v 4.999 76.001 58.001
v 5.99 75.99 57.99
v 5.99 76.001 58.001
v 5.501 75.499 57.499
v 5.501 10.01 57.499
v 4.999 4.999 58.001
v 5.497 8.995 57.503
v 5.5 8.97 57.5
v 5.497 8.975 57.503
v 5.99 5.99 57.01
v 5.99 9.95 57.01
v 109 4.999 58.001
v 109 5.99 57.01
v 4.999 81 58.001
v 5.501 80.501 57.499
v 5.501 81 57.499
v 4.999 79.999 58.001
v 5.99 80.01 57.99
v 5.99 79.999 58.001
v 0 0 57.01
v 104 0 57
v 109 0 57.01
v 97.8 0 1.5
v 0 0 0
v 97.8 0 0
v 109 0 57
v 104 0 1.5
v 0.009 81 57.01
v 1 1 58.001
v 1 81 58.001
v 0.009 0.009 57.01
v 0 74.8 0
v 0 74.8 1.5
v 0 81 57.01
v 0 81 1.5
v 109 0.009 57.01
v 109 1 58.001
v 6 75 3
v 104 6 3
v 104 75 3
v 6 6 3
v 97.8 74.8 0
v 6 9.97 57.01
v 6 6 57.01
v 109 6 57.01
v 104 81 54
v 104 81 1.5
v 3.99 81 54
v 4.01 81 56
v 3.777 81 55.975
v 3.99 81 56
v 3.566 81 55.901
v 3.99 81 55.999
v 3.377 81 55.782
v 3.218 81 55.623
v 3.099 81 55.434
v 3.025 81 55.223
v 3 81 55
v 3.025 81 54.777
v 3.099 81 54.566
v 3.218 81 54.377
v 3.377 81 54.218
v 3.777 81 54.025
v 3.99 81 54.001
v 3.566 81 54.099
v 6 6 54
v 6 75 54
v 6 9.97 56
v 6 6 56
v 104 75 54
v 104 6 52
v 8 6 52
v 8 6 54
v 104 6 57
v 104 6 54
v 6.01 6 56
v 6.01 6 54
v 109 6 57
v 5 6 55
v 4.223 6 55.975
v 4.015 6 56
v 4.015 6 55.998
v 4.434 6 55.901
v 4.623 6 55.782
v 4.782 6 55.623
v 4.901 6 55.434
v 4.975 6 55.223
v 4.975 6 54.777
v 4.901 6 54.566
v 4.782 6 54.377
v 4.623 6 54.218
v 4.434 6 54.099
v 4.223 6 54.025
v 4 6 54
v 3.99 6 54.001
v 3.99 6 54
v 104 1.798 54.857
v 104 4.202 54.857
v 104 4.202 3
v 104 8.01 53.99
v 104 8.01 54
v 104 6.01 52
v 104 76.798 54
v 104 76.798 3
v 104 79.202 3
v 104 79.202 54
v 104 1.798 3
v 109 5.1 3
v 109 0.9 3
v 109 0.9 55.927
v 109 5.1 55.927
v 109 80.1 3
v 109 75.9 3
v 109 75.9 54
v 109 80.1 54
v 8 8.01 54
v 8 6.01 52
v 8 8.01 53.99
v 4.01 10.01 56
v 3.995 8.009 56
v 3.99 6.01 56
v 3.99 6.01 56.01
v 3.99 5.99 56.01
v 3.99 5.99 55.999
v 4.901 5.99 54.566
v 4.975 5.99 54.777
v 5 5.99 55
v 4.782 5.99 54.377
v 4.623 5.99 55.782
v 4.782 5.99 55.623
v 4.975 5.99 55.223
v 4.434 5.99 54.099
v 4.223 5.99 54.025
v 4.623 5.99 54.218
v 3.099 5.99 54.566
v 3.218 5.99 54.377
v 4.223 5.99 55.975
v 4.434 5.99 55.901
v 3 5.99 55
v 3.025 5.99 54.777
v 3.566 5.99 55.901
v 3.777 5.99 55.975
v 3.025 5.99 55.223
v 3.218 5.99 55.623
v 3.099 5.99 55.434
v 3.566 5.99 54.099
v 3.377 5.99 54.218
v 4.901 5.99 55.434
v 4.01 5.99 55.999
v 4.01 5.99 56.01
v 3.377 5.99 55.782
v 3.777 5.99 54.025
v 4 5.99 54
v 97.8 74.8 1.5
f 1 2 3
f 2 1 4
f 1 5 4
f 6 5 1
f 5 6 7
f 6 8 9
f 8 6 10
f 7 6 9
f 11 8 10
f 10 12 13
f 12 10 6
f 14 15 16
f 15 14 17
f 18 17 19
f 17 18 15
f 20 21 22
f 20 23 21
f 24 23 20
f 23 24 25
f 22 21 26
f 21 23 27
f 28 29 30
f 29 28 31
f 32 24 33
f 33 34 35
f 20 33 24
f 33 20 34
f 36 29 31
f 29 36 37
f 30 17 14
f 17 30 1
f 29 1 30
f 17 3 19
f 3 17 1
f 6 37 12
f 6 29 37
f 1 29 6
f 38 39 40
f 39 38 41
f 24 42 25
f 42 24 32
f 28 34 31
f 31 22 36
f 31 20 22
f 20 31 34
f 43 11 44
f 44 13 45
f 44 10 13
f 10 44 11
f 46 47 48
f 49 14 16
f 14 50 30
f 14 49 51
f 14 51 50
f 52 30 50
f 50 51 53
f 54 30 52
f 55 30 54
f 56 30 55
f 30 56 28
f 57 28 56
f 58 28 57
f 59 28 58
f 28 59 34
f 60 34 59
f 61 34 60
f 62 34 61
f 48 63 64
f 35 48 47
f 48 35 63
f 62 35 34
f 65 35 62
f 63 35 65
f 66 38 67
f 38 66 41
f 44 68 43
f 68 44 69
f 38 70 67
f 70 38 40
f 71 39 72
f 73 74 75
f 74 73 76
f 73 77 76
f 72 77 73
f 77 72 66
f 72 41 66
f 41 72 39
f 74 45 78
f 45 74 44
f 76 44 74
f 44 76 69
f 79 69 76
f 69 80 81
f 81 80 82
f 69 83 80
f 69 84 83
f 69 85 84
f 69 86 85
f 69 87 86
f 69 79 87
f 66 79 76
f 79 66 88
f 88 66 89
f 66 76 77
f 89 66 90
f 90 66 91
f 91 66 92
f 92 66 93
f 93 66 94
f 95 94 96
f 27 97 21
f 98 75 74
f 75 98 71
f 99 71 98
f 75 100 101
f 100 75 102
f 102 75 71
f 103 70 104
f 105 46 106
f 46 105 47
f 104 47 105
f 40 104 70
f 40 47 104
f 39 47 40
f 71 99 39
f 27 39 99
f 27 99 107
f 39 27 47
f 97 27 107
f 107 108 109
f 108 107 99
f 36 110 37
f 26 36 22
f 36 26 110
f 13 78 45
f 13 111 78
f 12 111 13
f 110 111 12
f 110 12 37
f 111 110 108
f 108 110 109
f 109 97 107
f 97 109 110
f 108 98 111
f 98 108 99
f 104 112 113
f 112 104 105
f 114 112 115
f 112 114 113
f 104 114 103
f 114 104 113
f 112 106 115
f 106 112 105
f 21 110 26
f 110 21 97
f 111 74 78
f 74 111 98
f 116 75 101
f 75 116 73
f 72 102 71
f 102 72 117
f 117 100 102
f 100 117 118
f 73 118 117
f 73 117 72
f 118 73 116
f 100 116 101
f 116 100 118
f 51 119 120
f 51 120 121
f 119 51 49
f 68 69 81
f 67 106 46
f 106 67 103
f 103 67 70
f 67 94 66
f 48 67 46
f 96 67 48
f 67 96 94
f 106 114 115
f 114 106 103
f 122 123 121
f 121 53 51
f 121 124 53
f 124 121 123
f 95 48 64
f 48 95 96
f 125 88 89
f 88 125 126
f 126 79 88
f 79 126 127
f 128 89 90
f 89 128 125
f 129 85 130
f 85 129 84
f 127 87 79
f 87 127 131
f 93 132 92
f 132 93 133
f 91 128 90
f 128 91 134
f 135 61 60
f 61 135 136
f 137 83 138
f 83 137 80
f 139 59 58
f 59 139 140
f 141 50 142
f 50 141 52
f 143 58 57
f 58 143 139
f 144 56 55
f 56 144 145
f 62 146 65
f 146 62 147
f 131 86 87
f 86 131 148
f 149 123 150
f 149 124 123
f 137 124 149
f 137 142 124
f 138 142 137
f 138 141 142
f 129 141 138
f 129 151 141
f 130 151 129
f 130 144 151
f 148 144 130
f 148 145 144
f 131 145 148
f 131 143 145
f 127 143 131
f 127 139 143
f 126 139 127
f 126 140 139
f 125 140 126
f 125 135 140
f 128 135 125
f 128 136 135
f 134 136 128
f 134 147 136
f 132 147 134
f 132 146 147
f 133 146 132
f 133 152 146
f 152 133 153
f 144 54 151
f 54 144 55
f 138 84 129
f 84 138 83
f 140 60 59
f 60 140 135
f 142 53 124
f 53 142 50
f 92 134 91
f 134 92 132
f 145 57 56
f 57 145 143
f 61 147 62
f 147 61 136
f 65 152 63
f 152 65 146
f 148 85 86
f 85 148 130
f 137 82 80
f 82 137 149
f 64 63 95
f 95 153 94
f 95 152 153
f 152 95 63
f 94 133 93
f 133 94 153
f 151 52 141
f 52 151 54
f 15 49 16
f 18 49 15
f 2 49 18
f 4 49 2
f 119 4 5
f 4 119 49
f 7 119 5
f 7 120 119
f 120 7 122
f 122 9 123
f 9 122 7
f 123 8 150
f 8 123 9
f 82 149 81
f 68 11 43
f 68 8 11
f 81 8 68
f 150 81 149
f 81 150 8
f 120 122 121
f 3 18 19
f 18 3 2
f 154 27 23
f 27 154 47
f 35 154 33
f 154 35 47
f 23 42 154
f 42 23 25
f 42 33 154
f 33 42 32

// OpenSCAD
// ============================================================================
// cutlery_box.scad
// Graduated 3-chamber disposable-cutlery box (Option 3) — CUT-FROM-SOLID port
// of build_box.py, for a 120 x 120 x 120 mm printer (AOSEED).
//
// WHY THIS PORT EXISTS (the whole point):
//   The hand-mesh generator (build_box.py) could not keep the 1 mm rim chamfer
//   continuous across the female dovetail joints, because where a slot's flared
//   corner crosses the sloped chamfer it needs a true boolean intersection.
//   OpenSCAD HAS that boolean kernel, so here we do exactly the "cut-from-solid"
//   thing:
//      1. Build the ENTIRE box as ONE solid, WITH the chamfer already on it.
//      2. difference() out vertical dovetail prisms ( /_\ cross-section ),
//         running from just above the base plate up THROUGH the rim, to both
//         (a) form the sliding-dovetail joints, and
//         (b) split the box into 6 bed-sized pieces.
//   Because the cut is a real boolean through the already-chamfered solid, the
//   sloped chamfer<->slot edge is produced for free => the rim chamfer stays
//   CONTINUOUS across every joint, with none of the sliver hacks.
//
// ----------------------------------------------------------------------------
// HOW TO USE
//   In the app:  set `part` below (or use the Customizer dropdown), F5 to
//                preview, F6 to render, then File > Export > STL.
//   One piece (CLI):
//      openscad -o body_knife_A.stl -D 'part="knife_A"' cutlery_box.scad
//   ALL SIX (bash, run from this folder):
//      for p in knife_A knife_B fork_A fork_B spoon_A spoon_B; do \
//        openscad -o "body_$p.stl" -D "part=\"$p\"" cutlery_box.scad ; done
//   PNG preview of one piece:
//      openscad -o knife_B.png --imgsize=1400,1000 --autocenter --viewall \
//        -D 'part="knife_B"' cutlery_box.scad
//
//   Pieces are modelled in ASSEMBLED coordinates (floor-down, z=0 is the bed),
//   so importing all six STLs together shows the assembled box directly; your
//   slicer will auto-drop each one onto the plate for printing.
//
// BED SANITY: every piece is <= 120 mm in X, Y, Z.
//   Z = 58 mm. Widest piece = spoon at 117 mm (Y). A-halves reach 109 mm (X,
//   including the protruding dovetail key). All under 120.
//
// !! I could NOT run OpenSCAD to verify this file (no binary in my sandbox) !!
//   - The rim chamfer is a SMOOTH, true-45 bevel built from hull() frustums of
//     convex rectangles. Works in every OpenSCAD since ~2015 (incl. Homebrew
//     2021.01). No stepped staircase -- and, crucially, it makes box() a clean
//     well-formed solid so the per-part booleans resolve reliably (the old
//     14-slice staircase was fragile and CGAL was dropping the walls of the
//     interior parts, leaving only the key prisms => "floating boxes").
//   - roof() is still available behind USE_ROOF=true for those who have it
//     (2021.01+ snapshots); for THIS rectangular design it is identical, so it
//     is NOT required.
//   - After F6, check the console for "WARNING"/"not a valid 2-manifold".
//     If a tenon ever looks detached, bump EPS to 0.05.
// ============================================================================


/* [Part to render / export] */
part = "knife_A"; // [knife_A, knife_B, fork_A, fork_B, spoon_A, spoon_B, assembly]

/* [Chamfer method] */
// false = smooth hull() frustum bevel (default, any OpenSCAD); true = roof() (2021.01+)
USE_ROOF = false;

/* [Heights (mm)] */
BASE   = 3.0;     // floor / base-plate thickness
COMP_H = 55.0;    // interior wall height above the floor (cutlery stack depth)

/* [Walls (mm)] */
HOST_T   = 6.0;     // thickness of every wall (thick enough to host a dovetail)
HALF_LEN = 104.0;   // printed length of each half (A = near, B = far); <120 incl. key

/* [Chamber bays (mm)] */
N_COL     = 3;       // columns of cutlery per chamber
KNIFE_COL = 23.0;    // -> knife bay 69  (3 x 19 mm knives + play)
FORK_COL  = 33.0;    // -> fork  bay 99  (3 x 29 mm forks  + play)
SPOON_COL = 37.0;    // -> spoon bay 111 (3 x 34 mm spoons + play, trimmed <120)

/* [Dovetail joint (mm)] */
DT_DEPTH = 5.0;   // tail protrusion past the seam (male key depth)
DT_NECK  = 1.2;   // half-width at the seam face (narrow)
DT_FLARE = 2.1;   // half-width at the tip (wide -> locks)
DT_CLR   = 0.4;   // FLANK/seam slide clearance added to the female socket (do not change for fit)
DT_DEPTH_RELIEF = 0.3; // extra depth on the socket BACK only, so the tail tip never bottoms out

/* [Hidden-dovetail top cap / "hat" (mm)] */
// The dovetail otherwise shows its trapezoid outline on the TOP edge of the wall.
// To hide it, the MALE piece extends the wall's full-width top (chamfer included)
// across the key footprint -> a flush, continuous top. The FEMALE piece gets a
// matching top RECESS (cap footprint + CAP_CLR) so the cap drops straight in.
// Result: the top reads as one surface with a single straight seam line at the cap
// tip; the dovetail joinery lives entirely below the cap.
//
// SELF-SUPPORTING UNDERSIDE: the cap reaches the FULL wall width at the chamfer base
// (so the top edge reads as the wall extended, with NO recessed sliver on the outer
// face), and its underside is ONE planar ramp from the chamfer's OUTER CORNER
// (half-width HOST_T/2 at z = BODY_H-CHAMFER) down to the dovetail-neck half-width
// (CAP_FOOT) at CAP_SLANT_DEG from horizontal. No little horizontal step. The ramp
// reaching full width exactly at the chamfer base means "ramp top" == "chamfer base"
// (CAP_H is DERIVED). The FEMALE recess is the same ramp + CAP_CLR play.
// TRADEOFF: because the cap runs all the way to the outer corner, the female wall
// tapers to ~0 at z = BODY_H-CHAMFER -> a thin feather edge at the joint (gradual at
// CAP_SLANT_DEG, hidden inside the joint when assembled). Accepted per design intent.
CAP_SLANT_DEG = 50;     // cap underside ramp angle from horizontal (50 = self-supporting, long flare)
CAP_FOOT = DT_NECK;     // cap-underside half-width where it meets the dovetail neck
CAP_CLR = 0.3;          // slide clearance so the male cap seats into the female top recess

/* [Rim chamfer (mm)] */
CHAMFER = 1.0;    // 45-deg comfort break broken along the top wall edges

/* [Base half-lap / anti-warp (mm)] */
// Neighbouring base plates overlap as a HORIZONTAL half-lap (shiplap) at mid-base
// height, so corners stay coplanar (no lift/protrusion). Horizontal lap faces do
// NOT bind the vertical-drop assembly. Shingle direction: A->B and knife->fork->spoon.
LAP_LEN = 6;        // overlap past the A/B seam and the knife/fork seam
LAP_LEN_FS = 2;     // overlap past the fork/SPOON seam -- SMALLER: spoon is the
                    // tightest piece (117mm of the 120mm bed); a 6mm lap there
                    // would push spoon to 123mm. 2mm keeps spoon at 119mm.
LAP_Z   = BASE/2;   // 1.5 -- horizontal split height of the lap (bottom vs top half)
LAP_CLR = 0.2;      // in-plane clearance so the shelf isn't a press fit

/* [Lid — box features that receive a flat ORDERED clear sheet] */
// The lid itself is NOT printed: it's a flat ~2 mm PETG/Tritan sheet, bullnose-polished
// edges (r=LID_EDGE_R), ordered to size. We only model the box features that receive it.
LID_T            = 2.0;   // ordered sheet thickness
LID_EDGE_R       = 1.0;   // ordered sheet bullnose edge radius (for the sheet order spec)
LID_PLAY         = 0.4;   // total vertical play in the hinge groove (sheet + this)
LID_RECESS       = 2.0;   // lid TOP sits this far BELOW the rim, so the journal pocket is fully
                          // capped (rim caps the bullnose -> retains the lid when raised; tilt-in)
HINGE_AT_MINUS_X = true;  // hinge on the -x (303mm) end wall; clip on +x. (flip = mirror; default delivered)
// perimeter support ledge (lid underside rests on it at z = BODY_H-LID_T)
LEDGE_W          = 2.0;   // ledge inward protrusion (its underside ramps back at 45 deg -> self-supporting)
GROOVE_END_INSET = 0.0;   // journal runs the full chamber width, right to the corners
GROOVE_TAPER     = 4.0;   // y-length over which the eased mouth tapers out at each groove end
// hinge journal (cut into the inner face of the hinge end wall, CONTINUOUS along the long edge)
GROOVE_DEPTH     = 3.0;   // 2mm lead-in slot + 1mm pocket radius -> journal sits 2mm back from the
                          // face so its cap clears the swing relief and RETAINS the lid
GROOVE_POCKET_R  = 1.0;   // journal half-cylinder radius (the bullnose sheet edge rolls in it)
// clip latch (one localized retainer, centered on the clip end wall)
CLIP_W           = 18.0;  // clip width
CLIP_LIP         = 0.4;   // retaining overhang (0.3 light .. 0.6 firm)
CLIP_RAMP_H      = 1.6;   // cam-ramp height above the rim (press-to-close)
// finger scallop (semicircular dish in the rim, centered on & aligned with the clip)
SCALLOP_W        = 16.0;  // scallop width
SCALLOP_DEPTH    = 6.0;   // how far it dishes down from the rim


/* [Hidden] */
EPS      = 0.01;          // tiny overlap so abutting solids fuse cleanly in CGAL
// Upper-chamber pieces (fork, spoon) were cut by a cell plane laid EXACTLY on the
// divider wall's far face (the lower chamber owns that wall). intersection() along a
// plane coincident with an existing box face makes CGAL leave a ZERO-THICKNESS copy
// of the wall face -> edge-manifold + "watertight" but degenerate (OpenSCAD shows it
// as a blue back-face; Tinkercad thickens it into a phantom block). SEAM_EPS nudges
// those cut planes a hair INTO the open bay so they no longer coincide with any box
// face -> no flap. 0.02 mm is physically nothing but is well clear of CGAL's tolerance.
SEAM_EPS = 0.02;
CUT_OVER = 1.0;           // how far dovetail cutters overshoot the rim (clean cut)

BODY_H    = BASE + COMP_H;     // 58  total height
END_WALL  = HOST_T;            // end walls are dovetail hosts too -> equally thick
TOTAL_LEN = 2 * HALF_LEN;      // 208 assembled length (end wall .. end wall)

// hidden-cap ramp geometry (derived).
//   CAP_HW    = cap MAX half-width = HOST_T/2 (the full wall edge) at the chamfer base.
//   CAP_RISE  = vertical height of the self-supporting CAP_SLANT_DEG underside ramp.
//   CAP_ZRAMP = where the cap reaches full width = the chamfer base (BODY_H-CHAMFER), so
//               the ramp runs straight to the chamfer OUTER CORNER (no horizontal step).
//   CAP_ZBOT  = cap bottom = ramp start; CAP_H derived from it (for reference/report).
//   CAP_ZRAMP_R = recess ramp top, shifted down by CAP_CLR so the recess ramp stays
//               parallel to the cap ramp with uniform play.
CAP_HW      = HOST_T/2;   // cap reaches the FULL wall edge at the chamfer base
CAP_RISE    = (CAP_HW - CAP_FOOT) * tan(CAP_SLANT_DEG);
CAP_ZRAMP   = BODY_H - CHAMFER;               // full width exactly at the chamfer base / outer corner
CAP_ZBOT    = CAP_ZRAMP - CAP_RISE;
CAP_H       = BODY_H - CAP_ZBOT;              // derived; reported
CAP_ZRAMP_R = CAP_ZRAMP;   // recess ramp ALSO tops at the chamfer corner (mirror the cap) -> no vertical lip
// sanity checks
assert(CAP_ZBOT > BASE + 1,
       "cap zone dips too low -- raise CAP_SLANT_DEG");
assert(CAP_HW >= DT_FLARE,
       "cap too narrow to cover the dovetail tail");

// NOTE: lid-derived constants are defined BELOW the Y-layout block, because some of
// them (INTERIOR_Y0/Y1, CLIP_CY) depend on OUTER_L / OUTER_R / EXT_W. See "lid derived".

// bay widths
KNIFE_BAY = N_COL * KNIFE_COL; // 69
FORK_BAY  = N_COL * FORK_COL;  // 99
SPOON_BAY = N_COL * SPOON_COL; // 111

// ---- Y layout (width direction): wall | bay | divider | bay | divider | bay | wall
KNIFE_Y0 = 0;
KNIFE_Y1 = HOST_T + KNIFE_BAY + HOST_T;        // 0..81   (outer wall + bay + divider)
FORK_Y0  = KNIFE_Y1;                           // 81
FORK_Y1  = FORK_Y0 + FORK_BAY + HOST_T;        // 81..186 (bay + divider)
SPOON_Y0 = FORK_Y1;                            // 186
SPOON_Y1 = SPOON_Y0 + SPOON_BAY + HOST_T;      // 186..303(bay + outer wall)
EXT_W    = SPOON_Y1;                           // 303 total width

// lengthwise wall Y-bands [y0,y1] (host the A/B dovetails) + their centers
OUTER_L  = [0, HOST_T];                                       // [0,6]    c=3
DIV_KF   = [HOST_T + KNIFE_BAY, HOST_T + KNIFE_BAY + HOST_T]; // [75,81]  c=78
DIV_FS   = [FORK_Y0 + FORK_BAY, FORK_Y0 + FORK_BAY + HOST_T]; // [180,186]c=183
OUTER_R  = [SPOON_Y1 - HOST_T, SPOON_Y1];                     // [297,303]c=300

// ---- lid derived ---- (placed AFTER OUTER_L/OUTER_R/EXT_W so nothing is forward-referenced)
LID_TOP_Z   = BODY_H - LID_RECESS;        // 56  lid TOP (recessed); rim z=58 rises LID_RECESS above it
LID_Z_UNDER = LID_TOP_Z - LID_T;          // 54  lid underside / ledge top / lowered-divider top
POCKET_CZ   = LID_TOP_Z - LID_T/2;        // 55  journal centre (lid mid) -> pocket top = LID_TOP_Z = capped
// hinge end-wall inner face x + inward direction; clip end-wall inner face x + inward dir
HINGE_INX   = HINGE_AT_MINUS_X ? END_WALL : TOTAL_LEN - END_WALL;       // 6  (default)
HINGE_IN    = HINGE_AT_MINUS_X ? 1 : -1;  // interior direction from the hinge wall (+x default)
CLIP_INX    = HINGE_AT_MINUS_X ? TOTAL_LEN - END_WALL : END_WALL;       // 202 (default)
CLIP_IN     = HINGE_AT_MINUS_X ? -1 : 1;  // interior direction from the clip wall (-x default)
POCKET_CX   = HINGE_INX - HINGE_IN*(GROOVE_DEPTH - GROOVE_POCKET_R);    // 5  pocket centre x (INTO the wall)
INTERIOR_Y0 = OUTER_L[1];                 // 6   inner face of the -y short wall
INTERIOR_Y1 = OUTER_R[0];                 // 297 inner face of the +y short wall
CLIP_CY     = EXT_W/2;                     // 151.5 clip/scallop centre (in the fork chamber)
assert(POCKET_CZ - GROOVE_POCKET_R > BASE + 1,
       "journal dips too low -- reduce LID_RECESS or LID_T");
assert(POCKET_CZ + GROOVE_POCKET_R <= LID_TOP_Z + EPS,
       "journal not capped -- lower the lid (raise LID_RECESS) or shrink GROOVE_POCKET_R");
// NOTE: with LID_RECESS the lid underside (and lowered dividers) sit BELOW CAP_ZBOT. That is
// intended: the inner dividers are cut flat below the cap zone (their hidden caps are removed,
// but the lid covers them); the perimeter/end-wall caps are untouched (full-height walls).

// the three OPEN bays are rectangular holes in the wall footprint:
//   footprint = outer rectangle MINUS these bays  (== the 6 walls; verified).
// The smooth chamfer is built from exactly this decomposition.
BAY_X0 = END_WALL;              // 6
BAY_X1 = TOTAL_LEN - END_WALL;  // 202
BAYS = [
    [BAY_X0, BAY_X1, HOST_T,   HOST_T + KNIFE_BAY],   // knife bay [6,202] x [6,75]
    [BAY_X0, BAY_X1, FORK_Y0,  FORK_Y0 + FORK_BAY],   // fork  bay [6,202] x [81,180]
    [BAY_X0, BAY_X1, SPOON_Y0, SPOON_Y0 + SPOON_BAY], // spoon bay [6,202] x [186,297]
];

YC_OUTL  = OUTER_L[0] + HOST_T/2;   // 3   outer-left wall center
YC_DIVKF = DIV_KF[0]  + HOST_T/2;   // 78  knife/fork divider center
YC_DIVFS = DIV_FS[0]  + HOST_T/2;   // 183 fork/spoon divider center
YC_OUTR  = OUTER_R[0] + HOST_T/2;   // 300 outer-right wall center

// seams
AB_SEAM = HALF_LEN;               // 104  A/B length seam (x)
SEAM_KF = FORK_Y0;                // 81   knife/fork width seam (y)
SEAM_FS = SPOON_Y0;              // 186  fork/spoon width seam (y)
ENDC_A  = END_WALL/2;             // 3    A end-wall center (x) -> chamber dovetails
ENDC_B  = TOTAL_LEN - END_WALL/2; // 205  B end-wall center (x)


// ============================================================================
// 2D wall footprint (cross-section of all walls, constant in z for the straight
// part). Union of: 2 full-width end walls + 4 lengthwise walls between them.
// ============================================================================
module wall_footprint_2d() {
    // footprint = outer rectangle minus the 3 open bays  (== the 6 walls)
    difference() {
        square([TOTAL_LEN, EXT_W]);
        for (b = BAYS) translate([b[0], b[2]]) square([b[1] - b[0], b[3] - b[2]]);
    }
}

// ============================================================================
// The full chamfered box solid = base plate + walls with a continuous 1 mm
// top-rim chamfer. Built ONCE; every piece is carved out of this.
// ============================================================================
module chamfer_cap() {
    // SMOOTH 45 rim chamfer over z[BODY_H-CHAMFER, BODY_H], in absolute coords.
    zm = BODY_H - CHAMFER;
    if (USE_ROOF) {
        // exact straight-skeleton roof, capped at CHAMFER height (needs roof()).
        intersection() {
            translate([0,0,zm]) roof() wall_footprint_2d();
            translate([0,0,zm]) linear_extrude(CHAMFER + EPS) wall_footprint_2d();
        }
    } else {
        // DEFAULT: true 45 bevel as hull() frustums of CONVEX rectangles -> smooth
        // AND a clean manifold.  Since footprint = outer - bays, the chamfer of the
        // footprint = (outer rectangle beveled inward) MINUS (each bay beveled so it
        // grows toward the top, which bevels every bay-facing rim).  All hull()s are
        // on convex rectangles, so nothing gets convex-filled.
        difference() {
            // outer perimeter frustum: full outer rect at zm -> inset by CHAMFER at top
            hull() {
                translate([0,0,zm])     linear_extrude(0.001) square([TOTAL_LEN, EXT_W]);
                translate([0,0,BODY_H]) linear_extrude(0.001) offset(delta=-CHAMFER) square([TOTAL_LEN, EXT_W]);
            }
            // each bay grows by CHAMFER toward the top -> bevels its surrounding rim.
            // (overshoots z a hair past both ends so the cut is clean.)
            for (b = BAYS)
                hull() {
                    translate([0,0,zm-EPS])     linear_extrude(0.001)
                        translate([b[0],b[2]]) offset(delta=-EPS)        square([b[1]-b[0], b[3]-b[2]]);
                    translate([0,0,BODY_H+EPS]) linear_extrude(0.001)
                        translate([b[0],b[2]]) offset(delta=CHAMFER+EPS) square([b[1]-b[0], b[3]-b[2]]);
                }
        }
    }
}

module box() {
    zm = BODY_H - CHAMFER;
    union() {
        cube([TOTAL_LEN, EXT_W, BASE]);                                        // base plate z[0,3]
        translate([0,0,BASE]) linear_extrude(zm - BASE + EPS) wall_footprint_2d(); // straight walls z[3,57]
        chamfer_cap();                                                         // smooth chamfer z[57,58]
    }
}

// ============================================================================
// Dovetail prisms ( /_\ ). Vertical, z[BASE, BODY_H+CUT_OVER] so they cut
// through the rim but leave the base plate continuous. The near face is pushed
// back EPS so a male key always fuses to its wall.
//   male key   : half_n=DT_NECK,         half_f=DT_FLARE
//   female slot: half_n=DT_NECK+DT_CLR,  half_f=DT_FLARE+DT_CLR
// ============================================================================
module dt_prism_X(seam_x, yc, half_n, half_f) {   // perpendicular to X, grows +X
    translate([0,0,BASE]) linear_extrude(BODY_H - BASE + CUT_OVER)
        polygon([[seam_x - EPS,        yc - half_n],
                 [seam_x + DT_DEPTH,   yc - half_f],
                 [seam_x + DT_DEPTH,   yc + half_f],
                 [seam_x - EPS,        yc + half_n]]);
}
module dt_prism_Y(seam_y, xc, half_n, half_f) {   // perpendicular to Y, grows +Y
    translate([0,0,BASE]) linear_extrude(BODY_H - BASE + CUT_OVER)
        polygon([[xc - half_n, seam_y - EPS],
                 [xc - half_f, seam_y + DT_DEPTH],
                 [xc + half_f, seam_y + DT_DEPTH],
                 [xc + half_n, seam_y - EPS]]);
}
module ab_key   (yc)        { dt_prism_X(AB_SEAM, yc, DT_NECK, DT_FLARE); }
module ch_key   (seam_y, xc){ dt_prism_Y(seam_y, xc, DT_NECK, DT_FLARE); }

// Female sockets = male + DT_CLR on the flanks/seam (unchanged), PLUS a straight
// back-face relief of DT_DEPTH_RELIEF so the tail tip never bottoms out. The
// relief is a rectangle tacked onto the trapezoid's tip at the SAME flare width,
// so the angled flank faces (and their 0.4 mm slide clearance) are untouched.
module ab_socket(yc) {
    dt_prism_X(AB_SEAM, yc, DT_NECK + DT_CLR, DT_FLARE + DT_CLR);
    translate([0,0,BASE]) linear_extrude(BODY_H - BASE + CUT_OVER)
        translate([AB_SEAM + DT_DEPTH, yc - (DT_FLARE + DT_CLR)])
            square([DT_DEPTH_RELIEF, 2*(DT_FLARE + DT_CLR)]);          // back relief, +X
}
module ch_socket(seam_y, xc) {
    dt_prism_Y(seam_y, xc, DT_NECK + DT_CLR, DT_FLARE + DT_CLR);
    translate([0,0,BASE]) linear_extrude(BODY_H - BASE + CUT_OVER)
        translate([xc - (DT_FLARE + DT_CLR), seam_y + DT_DEPTH])
            square([2*(DT_FLARE + DT_CLR), DT_DEPTH_RELIEF]);          // back relief, +Y
}

// ===== hidden-dovetail top cap ("hat"), SELF-SUPPORTING underside ===============
// MALE cap: a FULL-wall-width hat whose underside is ONE planar ramp from the chamfer's
// OUTER CORNER (half-width CAP_HW = HOST_T/2 at CAP_ZRAMP = BODY_H-CHAMFER) down to the
// dovetail-neck half-width (CAP_FOOT) at CAP_SLANT_DEG from horizontal -> the self-
// supporting shoulder, running straight to the corner (no horizontal step). Built as
// hull(narrow bottom slab buried in the tail neck, full-width top slab through the rim);
// box() trims it to the wall and adds the continuous rim chamfer for free, so the outer
// top edge reads as the wall extended (no recessed sliver). The protruding NOSE is left
// SQUARE (vertical) -- hidden in the female socket when assembled.
// TRADEOFF: the female wall tapers to ~0 at z=BODY_H-CHAMFER (a thin feather edge at the
// joint, gradual at CAP_SLANT_DEG) -- accepted per design intent.
module ab_cap(yc) {   // A/B seam, grows +X past the seam (length direction)
    hull() {
        translate([AB_SEAM - EPS, yc - CAP_FOOT, CAP_ZBOT])
            cube([DT_DEPTH + EPS, 2*CAP_FOOT, EPS]);
        translate([AB_SEAM - EPS, yc - CAP_HW,   CAP_ZRAMP])
            cube([DT_DEPTH + EPS, 2*CAP_HW, (BODY_H + CUT_OVER) - CAP_ZRAMP]);
    }
}
module ch_cap(seam_y, xc) {   // chamber seam, grows +Y past the seam (in the end wall)
    hull() {
        translate([xc - CAP_FOOT, seam_y - EPS, CAP_ZBOT])
            cube([2*CAP_FOOT, DT_DEPTH + EPS, EPS]);
        translate([xc - CAP_HW,   seam_y - EPS, CAP_ZRAMP])
            cube([2*CAP_HW, DT_DEPTH + EPS, (BODY_H + CUT_OVER) - CAP_ZRAMP]);
    }
}
// FEMALE recess: the SAME ramp grown by CAP_CLR (flanks, tip, floor, and ramp shifted down
// by CAP_CLR so it stays parallel) -> the cap seats with uniform slide clearance. It opens
// to the wall edge (and a hair past, into air) so the cap's full-width corner drops in;
// this is what leaves the thin female feather at the top (accepted). Open upward + toward seam.
module ab_cap_neg(yc) {
    hull() {
        translate([AB_SEAM - EPS, yc - (CAP_FOOT + CAP_CLR), CAP_ZBOT - CAP_CLR])
            cube([DT_DEPTH + CAP_CLR + EPS, 2*(CAP_FOOT + CAP_CLR), EPS]);
        translate([AB_SEAM - EPS, yc - (CAP_HW + EPS), CAP_ZRAMP_R])
            cube([DT_DEPTH + CAP_CLR + EPS, 2*(CAP_HW + EPS), (BODY_H + CUT_OVER + 1) - CAP_ZRAMP_R]);
    }
}
module ch_cap_neg(seam_y, xc) {
    hull() {
        translate([xc - (CAP_FOOT + CAP_CLR), seam_y - EPS, CAP_ZBOT - CAP_CLR])
            cube([2*(CAP_FOOT + CAP_CLR), DT_DEPTH + CAP_CLR + EPS, EPS]);
        translate([xc - (CAP_HW + EPS), seam_y - EPS, CAP_ZRAMP_R])
            cube([2*(CAP_HW + EPS), DT_DEPTH + CAP_CLR + EPS, (BODY_H + CUT_OVER + 1) - CAP_ZRAMP_R]);
    }
}

// rectangular cell (x[xa,xb], y[ya,yb], full height + margin) used to split pieces
module cell(xa, xb, ya, yb) {
    translate([xa, ya, -1]) cube([xb - xa, yb - ya, BODY_H + 11]);
}

// ===== base half-lap (shiplap) =================================================
// HORIZONTAL lap at mid-base height: the shelf-owner keeps its BOTTOM half
// (z 0..LAP_Z) extending LAP_LEN past the seam; the neighbour has its bottom half
// REMOVED there (keeps only the top half) and lands flat on the shelf. Horizontal
// faces => no binding during the vertical drop. Shelves live entirely in the base
// (z < BASE), well clear of the wall dovetails (z >= BASE).
// Shingle = FEMALE-first (matches the no-notch dovetail assembly order, which
// lowers the male piece onto the female): the B half owns the A/B shelf (grows
// -X into A) and the UPPER chamber (fork, spoon) owns the chamber shelf (grows
// -Y into the lower chamber).  Order: spoon, fork, knife; B before A.
module lap_shelf_X(y0, y1) {                 // B-side shelf, grows -X into A past AB_SEAM
    // +EPS past AB_SEAM so the shelf interpenetrates (not just abuts) its own B body -> fuses cleanly.
    translate([AB_SEAM - LAP_LEN, y0, 0]) cube([LAP_LEN + EPS, y1 - y0, LAP_Z]);
}
module lap_neg_X(y0, y1) {                   // A-side: remove bottom half to receive it
    translate([AB_SEAM - LAP_LEN - LAP_CLR, y0 - EPS, -EPS])
        cube([LAP_LEN + LAP_CLR + EPS, (y1 - y0) + 2*EPS, LAP_Z + EPS]);
}
module lap_shelf_Y(seam_y, x0, x1, ln=LAP_LEN) {   // upper-chamber shelf, grows -Y into lower
    // grows -Y by `ln` into the lower chamber AND +Y by 2*SEAM_EPS past the seam so it
    // always overlaps the (SEAM_EPS-nudged) body floor and stays fused -> no floating shelf.
    translate([x0, seam_y - ln, 0]) cube([x1 - x0, ln + 2*SEAM_EPS, LAP_Z]);
}
module lap_neg_Y(seam_y, x0, x1, ln=LAP_LEN) {     // lower-chamber: remove bottom half
    translate([x0 - EPS, seam_y - ln - LAP_CLR, -EPS])
        cube([(x1 - x0) + 2*EPS, ln + LAP_CLR + EPS, LAP_Z + EPS]);
}

// ============================================================================
// LID FEATURES (receive a flat ORDERED clear sheet; the sheet is not printed).
// All features live at the TOP (z >= ~52), ABOVE the dovetail engagement, the half-lap
// (z<1.5) and most of the hat, so the vertical-drop assembly and joints are untouched.
// EPS overlaps throughout; no coincident coplanar faces with the existing walls.
// Default orientation: HINGE on the -x end wall (A pieces), CLIP on the +x end wall
// (B pieces), clip+scallop centred on the fork (middle) chamber.
// ============================================================================

// --- perimeter support ledge: 45-deg self-supporting brackets; rest face at LID_Z_UNDER.
//     Runs along the CLIP end wall + the two short outer walls. (Hinge wall uses the groove.)
//     Built as hull(thin top edge, wall column) -> a triangular bracket whose underside is
//     a 45-deg ramp (prints floor-down with no support). ADDED to each piece (clipped by cell).
//     Each run is INSET by LEDGE_W from the perpendicular walls so the three brackets never
//     overlap at a corner and the wall's normal chamfer wraps every corner uninterrupted.
module lid_ledge() {
    cy0 = INTERIOR_Y0 + LEDGE_W;  cy1 = INTERIOR_Y1 - LEDGE_W;  cyl = cy1 - cy0;   // clip-run y span (inset)
    sx0 = END_WALL    + LEDGE_W;  sxl = (TOTAL_LEN - 2*END_WALL) - 2*LEDGE_W;       // short-run x span (inset)
    // clip end wall (x = CLIP_INX), bracket protrudes toward interior (CLIP_IN)
    hull() {
        translate([CLIP_INX + CLIP_IN*LEDGE_W, cy0, LID_Z_UNDER - EPS]) cube([EPS, cyl, EPS]);
        translate([CLIP_INX - EPS,             cy0, LID_Z_UNDER - LEDGE_W]) cube([2*EPS, cyl, LEDGE_W]);
    }
    // OUTER_L short wall (y = INTERIOR_Y0), bracket protrudes +y
    hull() {
        translate([sx0, INTERIOR_Y0 + LEDGE_W, LID_Z_UNDER - EPS]) cube([sxl, EPS, EPS]);
        translate([sx0, INTERIOR_Y0 - EPS,     LID_Z_UNDER - LEDGE_W]) cube([sxl, 2*EPS, LEDGE_W]);
    }
    // OUTER_R short wall (y = INTERIOR_Y1), bracket protrudes -y
    hull() {
        translate([sx0, INTERIOR_Y1 - LEDGE_W, LID_Z_UNDER - EPS]) cube([sxl, EPS, EPS]);
        translate([sx0, INTERIOR_Y1 - EPS,     LID_Z_UNDER - LEDGE_W]) cube([sxl, 2*EPS, LEDGE_W]);
    }
}

// --- hinge groove: a lead-in slot + a journal half-cylinder pocket, CAPPED at the recessed
//     lid top (LID_TOP_Z). The rim (z[LID_TOP_Z,BODY_H]) caps the bullnose so the lid is
//     RETAINED when raised. Insertion is TILT-IN: raise the lid to the open angle, slide the
//     bullnose under the cap into the journal, swing down to close. A 45-deg mouth-ease
//     relieves the cap's inner-bottom edge (corner at HINGE_INX, LID_TOP_Z) so the lid clears
//     as it swings; the relief TAPERS to nothing over GROOVE_TAPER at each end (clean corners).
//     CONTINUOUS along the long edge (y ~8..295); shaves only the top inner tips of the two
//     chamber dovetails -- engagement below the journal and the ~3mm outer wall remain.
// Relief = ONE straight ramp from the journal's inner-top (POCKET_CX, LID_TOP_Z) up to the
// inner rim (HINGE_INX, BODY_H). No kink; the ~45-deg ramp is self-supporting (prints clean);
// the cap stays full directly over the bullnose (x=POCKET_CX) so retention survives; the relief
// grows toward the inner edge, matching the lid's rotation about the journal.
module mouth_tri() {
    polygon([[POCKET_CX,                LID_TOP_Z - EPS],
             [HINGE_INX + HINGE_IN*EPS, LID_TOP_Z - EPS],
             [HINGE_INX + HINGE_IN*EPS, BODY_H + EPS]]);
}
module mouth_slab(yc, dy) {                          // thin ramp slice centred at yc
    translate([0, yc - dy/2, 0]) rotate([90,0,0]) translate([0,0,-dy]) linear_extrude(dy) mouth_tri();
}
module mouth_taper(yApex, yFull) {                   // relief tapers to nothing at yApex (the ramp apex)
    hull() {
        mouth_slab(yFull, 2*EPS);
        translate([POCKET_CX - EPS, yApex - EPS, LID_TOP_Z - EPS]) cube([2*EPS, 2*EPS, 2*EPS]);
    }
}
module hinge_groove() {
    gy0 = INTERIOR_Y0 + GROOVE_END_INSET;            // 8    start (inset past the corner chamfer)
    gy1 = INTERIOR_Y1 - GROOVE_END_INSET;            // 295  end
    sx0 = min(POCKET_CX, HINGE_INX);  sx1 = max(POCKET_CX, HINGE_INX);   // x[4,6]: 2mm lead-in
    // lead-in slot (sheet thickness, capped at the lid top) from the journal out to the inner face
    translate([sx0 - EPS, gy0, LID_Z_UNDER]) cube([sx1 - sx0 + 2*EPS, gy1 - gy0, LID_TOP_Z - LID_Z_UNDER]);
    // journal half-cylinder 2mm back from the face -> its cap (x[3,5]) clears the relief => retains the lid
    translate([POCKET_CX, gy0 - EPS, POCKET_CZ]) rotate([-90,0,0]) cylinder(h = gy1 - gy0 + 2*EPS, r = GROOVE_POCKET_R, $fn = 28);
    // eased mouth (relieves the cap inner-bottom corner): full middle prism + tapered ends
    mt = min(GROOVE_TAPER, (gy1 - gy0)/2 - EPS);
    translate([0, gy0 + mt, 0]) rotate([90,0,0]) translate([0,0,-((gy1 - mt) - (gy0 + mt))]) linear_extrude((gy1 - mt) - (gy0 + mt)) mouth_tri();
    mouth_taper(gy0, gy0 + mt);                       // taper out at the -y corner
    mouth_taper(gy1, gy1 - mt);                       // taper out at the +y corner
}

// --- lower the inner chamber dividers to the lid underside (mid-support, no sag).
//     Removes the divider top over the full length; outer walls keep full height.
module divider_lower() {
    // x-span is the CHAMBER BAY only [BAY_X0, BAY_X1] (+EPS overlap into the end walls so the
    // cut is manifold). The end/outer walls keep their full BODY_H tops; only the two INNER
    // dividers (DIV_KF, DIV_FS) are lowered.
    translate([BAY_X0 - EPS, DIV_KF[0], LID_Z_UNDER]) cube([BAY_X1 - BAY_X0 + 2*EPS, HOST_T, BODY_H - LID_Z_UNDER + CUT_OVER]);
    translate([BAY_X0 - EPS, DIV_FS[0], LID_Z_UNDER]) cube([BAY_X1 - BAY_X0 + 2*EPS, HOST_T, BODY_H - LID_Z_UNDER + CUT_OVER]);
}

// --- retaining clip (ADDED): a lip on the clip end wall, centred on CLIP_CY, that overhangs
//     the RECESSED lid top (LID_TOP_Z) by CLIP_LIP and holds it down. A lead-in ramp above the
//     lip (up to LID_TOP_Z+CLIP_RAMP_H, still below the rim) cams the lid under as it swings
//     closed. Anchored into the wall (x = CLIP_INX-CLIP_IN*HOST_T/2). Added AFTER the scallop
//     cut so the scallop never undercuts it. No longer protrudes above the rim.
module lid_clip() {
    translate([0, CLIP_CY - CLIP_W/2, 0]) rotate([90,0,0]) translate([0,0,-CLIP_W]) linear_extrude(CLIP_W)
        polygon([[CLIP_INX - CLIP_IN*HOST_T/2, LID_TOP_Z - 0.8],         // anchor low, into the wall (fuse)
                 [CLIP_INX + CLIP_IN*CLIP_LIP, LID_TOP_Z],               // lip tip: overhang over the lid top
                 [CLIP_INX + CLIP_IN*CLIP_LIP, LID_TOP_Z + 0.4],         // lip front
                 [CLIP_INX - CLIP_IN*HOST_T/2, LID_TOP_Z + CLIP_RAMP_H]]);// lead-in ramp up into the wall
}

// --- finger scallop (CUT): a semicircular dish in the rim's INNER edge at the clip, so a
//     fingertip reaches under the lid edge to release it. Interior half only (does not
//     touch the wall body or the clip's anchor).
module lid_scallop() {
    intersection() {
        translate([CLIP_INX, CLIP_CY, BODY_H - SCALLOP_DEPTH]) cylinder(h = SCALLOP_DEPTH + EPS, r = SCALLOP_W/2, $fn = 40);
        translate([CLIP_INX + (CLIP_IN<0 ? -SCALLOP_W : 0), CLIP_CY - SCALLOP_W, BODY_H - SCALLOP_DEPTH - EPS])
            cube([SCALLOP_W, 2*SCALLOP_W, SCALLOP_DEPTH + 2*EPS]);
    }
}

// ============================================================================
// The six pieces.  piece = intersection(box, cell + own male keys) - own sockets
//   A halves are MALE on the A/B seam (keep the key); B halves are FEMALE (slot).
//   On a chamber seam the LEFT chamber is male (+Y), the right chamber is female.
// ============================================================================
// Base half-lap shingling (FEMALE-first, Option 1):
//   A/B seam  -> the B half owns the bottom shelf (grows -X), A has the negative.
//   chamber   -> the UPPER chamber (fork, spoon) owns the shelf (grows -Y); the
//                lower chamber (knife, fork) has the negative.
//   Assembly order: spoon, fork, knife; B before A (male lowered onto female).
// Center crossings (104,81)&(104,186): the CHAMBER shelf (fork_A / spoon_A) owns the
//   crossing square; the B-half A/B shelf (knife_B / fork_B) is CLIPPED short of the
//   chamber seam by LAP_LEN so two shelves never collide.
module knife_A() {                                       // placed LAST; receives everything
    difference() {
        union() {
            intersection() {
                box();
                union() {
                    cell(-1, AB_SEAM, KNIFE_Y0 - 1, KNIFE_Y1);
                    ab_key(YC_OUTL); ab_key(YC_DIVKF);   // hinge-end chamber dovetail removed -> plain chamfer
                    ab_cap(YC_OUTL); ab_cap(YC_DIVKF);   // hide tops (male)
                }
            }
            intersection() { lid_ledge(); cell(-1, AB_SEAM, KNIFE_Y0 - 1, KNIFE_Y1); }  // lid support ledge
        }
        lap_neg_X(KNIFE_Y0, KNIFE_Y1);            // receive knife_B's A/B shelf
        lap_neg_Y(SEAM_KF, 0, AB_SEAM);           // receive fork_A's chamber shelf
        hinge_groove(); divider_lower(); lid_scallop();   // lid cuts (groove hits A pieces; divider/scallop where present)
    }
}

module knife_B() {
    difference() {
        union() {
            intersection() {
                box();
                union() {
                    cell(AB_SEAM, TOTAL_LEN + 1, KNIFE_Y0 - 1, KNIFE_Y1);
                    ch_key(SEAM_KF, ENDC_B);
                    ch_cap(SEAM_KF, ENDC_B);                // hide top (male, chamber)
                }
            }
            lap_shelf_X(KNIFE_Y0, KNIFE_Y1 - LAP_LEN);  // A/B shelf -> knife_A (CLIPPED at y=81 crossing)
            intersection() { lid_ledge(); cell(AB_SEAM, TOTAL_LEN + 1, KNIFE_Y0 - 1, KNIFE_Y1); }  // lid support ledge
        }
        ab_socket(YC_OUTL); ab_socket(YC_DIVKF);
        ab_cap_neg(YC_OUTL); ab_cap_neg(YC_DIVKF);      // top recesses to receive knife_A's caps (female)
        lap_neg_Y(SEAM_KF, AB_SEAM, TOTAL_LEN);         // receive fork_B's chamber shelf
        hinge_groove(); divider_lower(); lid_scallop();   // lid cuts
    }
}

module fork_A() {
    difference() {
        union() {
            intersection() {
                box();
                union() {
                    cell(-1, AB_SEAM, FORK_Y0 + SEAM_EPS, FORK_Y1);  // -Y cut nudged off the divider face
                    ab_key(YC_DIVFS);   // hinge-end chamber dovetail removed -> plain chamfer
                    ab_cap(YC_DIVFS);   // hide top (male)
                }
            }
            lap_shelf_Y(SEAM_KF, 0, AB_SEAM);           // chamber shelf -> knife_A (owns crossing)
            intersection() { lid_ledge(); cell(-1, AB_SEAM, FORK_Y0 + SEAM_EPS, FORK_Y1); }  // lid support ledge (none in fork-A)
        }
        lap_neg_X(FORK_Y0, FORK_Y1);                    // receive fork_B's A/B shelf
        // hinge-end chamber socket removed -> plain butt seam (knife_A/fork_A held via the A/B + clip-end joints)
        lap_neg_Y(SEAM_FS, 0, AB_SEAM, LAP_LEN_FS);     // receive spoon_A's (small) chamber shelf
        hinge_groove(); divider_lower(); lid_scallop();   // lid cuts (groove = fork-A hinge segment; divider = DIV_FS)
    }
}

module fork_B() {
    union() {
        difference() {
            union() {
                intersection() {
                    box();
                    union() {
                        cell(AB_SEAM, TOTAL_LEN + 1, FORK_Y0 + SEAM_EPS, FORK_Y1);  // -Y cut nudged off the divider face
                        ch_key(SEAM_FS, ENDC_B);
                        ch_cap(SEAM_FS, ENDC_B);                // hide top (male, chamber)
                    }
                }
                lap_shelf_X(FORK_Y0, FORK_Y1 - LAP_LEN_FS); // A/B shelf -> fork_A (CLIPPED at y=186 crossing)
                lap_shelf_Y(SEAM_KF, AB_SEAM, TOTAL_LEN);   // chamber shelf -> knife_B
                intersection() { lid_ledge(); cell(AB_SEAM, TOTAL_LEN + 1, FORK_Y0 + SEAM_EPS, FORK_Y1); }  // lid ledge (clip-end run)
            }
            ab_socket(YC_DIVFS);
            ab_cap_neg(YC_DIVFS);                           // top recess to receive fork_A's A/B cap (female)
            ch_socket(SEAM_KF, ENDC_B);
            ch_cap_neg(SEAM_KF, ENDC_B);                    // top recess to receive knife_B's chamber cap (female)
            lap_neg_Y(SEAM_FS, AB_SEAM, TOTAL_LEN, LAP_LEN_FS); // receive spoon_B's (small) chamber shelf
            hinge_groove(); divider_lower(); lid_scallop();     // lid cuts (scallop lands here)
        }
        intersection() { lid_clip(); cell(AB_SEAM, TOTAL_LEN + 1, FORK_Y0 + SEAM_EPS, FORK_Y1); }  // retaining clip, added AFTER the scallop cut
    }
}

module spoon_A() {
    difference() {
        union() {
            intersection() {
                box();
                union() {
                    cell(-1, AB_SEAM, SPOON_Y0 + SEAM_EPS, SPOON_Y1 + 1);  // -Y cut nudged off the divider face
                    ab_key(YC_OUTR);
                    ab_cap(YC_OUTR);                        // hide top (male)
                }
            }
            lap_shelf_Y(SEAM_FS, 0, AB_SEAM, LAP_LEN_FS); // chamber shelf -> fork_A (small; owns crossing)
            intersection() { lid_ledge(); cell(-1, AB_SEAM, SPOON_Y0 + SEAM_EPS, SPOON_Y1 + 1); }  // lid support ledge (OUTER_R run)
        }
        lap_neg_X(SPOON_Y0, SPOON_Y1);                  // receive spoon_B's A/B shelf
        // hinge-end chamber socket removed -> plain butt seam (fork_A/spoon_A held via the A/B + clip-end joints)
        hinge_groove(); divider_lower(); lid_scallop();   // lid cuts (groove = spoon-A hinge segment)
    }
}

module spoon_B() {                                      // placed FIRST; owns shelves
    difference() {
        union() {
            intersection() {
                box();
                union() {
                    cell(AB_SEAM, TOTAL_LEN + 1, SPOON_Y0 + SEAM_EPS, SPOON_Y1 + 1);  // -Y cut nudged off the divider face
                }
            }
            lap_shelf_X(SPOON_Y0, SPOON_Y1);            // A/B shelf -> spoon_A
            lap_shelf_Y(SEAM_FS, AB_SEAM, TOTAL_LEN, LAP_LEN_FS); // chamber shelf -> fork_B (small)
            intersection() { lid_ledge(); cell(AB_SEAM, TOTAL_LEN + 1, SPOON_Y0 + SEAM_EPS, SPOON_Y1 + 1); }  // lid ledge (OUTER_R + clip-end runs)
        }
        ab_socket(YC_OUTR);
        ab_cap_neg(YC_OUTR);                            // top recess to receive spoon_A's A/B cap (female)
        ch_socket(SEAM_FS, ENDC_B);
        ch_cap_neg(SEAM_FS, ENDC_B);                    // top recess to receive fork_B's chamber cap (female)
        hinge_groove(); divider_lower(); lid_scallop();   // lid cuts
    }
}

// Fast preview: the full continuous-chamfer box (no cuts). The six part modules
// above are the real, separable pieces. To instead see the TRUE assembled
// pieces with their joints (slower — 6 booleans), replace box(); below with:
//   knife_A(); knife_B(); fork_A(); fork_B(); spoon_A(); spoon_B();
module assembly() {
    box();
}

// ============================================================================
// Render dispatch
// ============================================================================
if      (part == "knife_A")  knife_A();
else if (part == "knife_B")  knife_B();
else if (part == "fork_A")   fork_A();
else if (part == "fork_B")   fork_B();
else if (part == "spoon_A")  spoon_A();
else if (part == "spoon_B")  spoon_B();
else if (part == "assembly") assembly();
else echo(str("Unknown part: ", part));
